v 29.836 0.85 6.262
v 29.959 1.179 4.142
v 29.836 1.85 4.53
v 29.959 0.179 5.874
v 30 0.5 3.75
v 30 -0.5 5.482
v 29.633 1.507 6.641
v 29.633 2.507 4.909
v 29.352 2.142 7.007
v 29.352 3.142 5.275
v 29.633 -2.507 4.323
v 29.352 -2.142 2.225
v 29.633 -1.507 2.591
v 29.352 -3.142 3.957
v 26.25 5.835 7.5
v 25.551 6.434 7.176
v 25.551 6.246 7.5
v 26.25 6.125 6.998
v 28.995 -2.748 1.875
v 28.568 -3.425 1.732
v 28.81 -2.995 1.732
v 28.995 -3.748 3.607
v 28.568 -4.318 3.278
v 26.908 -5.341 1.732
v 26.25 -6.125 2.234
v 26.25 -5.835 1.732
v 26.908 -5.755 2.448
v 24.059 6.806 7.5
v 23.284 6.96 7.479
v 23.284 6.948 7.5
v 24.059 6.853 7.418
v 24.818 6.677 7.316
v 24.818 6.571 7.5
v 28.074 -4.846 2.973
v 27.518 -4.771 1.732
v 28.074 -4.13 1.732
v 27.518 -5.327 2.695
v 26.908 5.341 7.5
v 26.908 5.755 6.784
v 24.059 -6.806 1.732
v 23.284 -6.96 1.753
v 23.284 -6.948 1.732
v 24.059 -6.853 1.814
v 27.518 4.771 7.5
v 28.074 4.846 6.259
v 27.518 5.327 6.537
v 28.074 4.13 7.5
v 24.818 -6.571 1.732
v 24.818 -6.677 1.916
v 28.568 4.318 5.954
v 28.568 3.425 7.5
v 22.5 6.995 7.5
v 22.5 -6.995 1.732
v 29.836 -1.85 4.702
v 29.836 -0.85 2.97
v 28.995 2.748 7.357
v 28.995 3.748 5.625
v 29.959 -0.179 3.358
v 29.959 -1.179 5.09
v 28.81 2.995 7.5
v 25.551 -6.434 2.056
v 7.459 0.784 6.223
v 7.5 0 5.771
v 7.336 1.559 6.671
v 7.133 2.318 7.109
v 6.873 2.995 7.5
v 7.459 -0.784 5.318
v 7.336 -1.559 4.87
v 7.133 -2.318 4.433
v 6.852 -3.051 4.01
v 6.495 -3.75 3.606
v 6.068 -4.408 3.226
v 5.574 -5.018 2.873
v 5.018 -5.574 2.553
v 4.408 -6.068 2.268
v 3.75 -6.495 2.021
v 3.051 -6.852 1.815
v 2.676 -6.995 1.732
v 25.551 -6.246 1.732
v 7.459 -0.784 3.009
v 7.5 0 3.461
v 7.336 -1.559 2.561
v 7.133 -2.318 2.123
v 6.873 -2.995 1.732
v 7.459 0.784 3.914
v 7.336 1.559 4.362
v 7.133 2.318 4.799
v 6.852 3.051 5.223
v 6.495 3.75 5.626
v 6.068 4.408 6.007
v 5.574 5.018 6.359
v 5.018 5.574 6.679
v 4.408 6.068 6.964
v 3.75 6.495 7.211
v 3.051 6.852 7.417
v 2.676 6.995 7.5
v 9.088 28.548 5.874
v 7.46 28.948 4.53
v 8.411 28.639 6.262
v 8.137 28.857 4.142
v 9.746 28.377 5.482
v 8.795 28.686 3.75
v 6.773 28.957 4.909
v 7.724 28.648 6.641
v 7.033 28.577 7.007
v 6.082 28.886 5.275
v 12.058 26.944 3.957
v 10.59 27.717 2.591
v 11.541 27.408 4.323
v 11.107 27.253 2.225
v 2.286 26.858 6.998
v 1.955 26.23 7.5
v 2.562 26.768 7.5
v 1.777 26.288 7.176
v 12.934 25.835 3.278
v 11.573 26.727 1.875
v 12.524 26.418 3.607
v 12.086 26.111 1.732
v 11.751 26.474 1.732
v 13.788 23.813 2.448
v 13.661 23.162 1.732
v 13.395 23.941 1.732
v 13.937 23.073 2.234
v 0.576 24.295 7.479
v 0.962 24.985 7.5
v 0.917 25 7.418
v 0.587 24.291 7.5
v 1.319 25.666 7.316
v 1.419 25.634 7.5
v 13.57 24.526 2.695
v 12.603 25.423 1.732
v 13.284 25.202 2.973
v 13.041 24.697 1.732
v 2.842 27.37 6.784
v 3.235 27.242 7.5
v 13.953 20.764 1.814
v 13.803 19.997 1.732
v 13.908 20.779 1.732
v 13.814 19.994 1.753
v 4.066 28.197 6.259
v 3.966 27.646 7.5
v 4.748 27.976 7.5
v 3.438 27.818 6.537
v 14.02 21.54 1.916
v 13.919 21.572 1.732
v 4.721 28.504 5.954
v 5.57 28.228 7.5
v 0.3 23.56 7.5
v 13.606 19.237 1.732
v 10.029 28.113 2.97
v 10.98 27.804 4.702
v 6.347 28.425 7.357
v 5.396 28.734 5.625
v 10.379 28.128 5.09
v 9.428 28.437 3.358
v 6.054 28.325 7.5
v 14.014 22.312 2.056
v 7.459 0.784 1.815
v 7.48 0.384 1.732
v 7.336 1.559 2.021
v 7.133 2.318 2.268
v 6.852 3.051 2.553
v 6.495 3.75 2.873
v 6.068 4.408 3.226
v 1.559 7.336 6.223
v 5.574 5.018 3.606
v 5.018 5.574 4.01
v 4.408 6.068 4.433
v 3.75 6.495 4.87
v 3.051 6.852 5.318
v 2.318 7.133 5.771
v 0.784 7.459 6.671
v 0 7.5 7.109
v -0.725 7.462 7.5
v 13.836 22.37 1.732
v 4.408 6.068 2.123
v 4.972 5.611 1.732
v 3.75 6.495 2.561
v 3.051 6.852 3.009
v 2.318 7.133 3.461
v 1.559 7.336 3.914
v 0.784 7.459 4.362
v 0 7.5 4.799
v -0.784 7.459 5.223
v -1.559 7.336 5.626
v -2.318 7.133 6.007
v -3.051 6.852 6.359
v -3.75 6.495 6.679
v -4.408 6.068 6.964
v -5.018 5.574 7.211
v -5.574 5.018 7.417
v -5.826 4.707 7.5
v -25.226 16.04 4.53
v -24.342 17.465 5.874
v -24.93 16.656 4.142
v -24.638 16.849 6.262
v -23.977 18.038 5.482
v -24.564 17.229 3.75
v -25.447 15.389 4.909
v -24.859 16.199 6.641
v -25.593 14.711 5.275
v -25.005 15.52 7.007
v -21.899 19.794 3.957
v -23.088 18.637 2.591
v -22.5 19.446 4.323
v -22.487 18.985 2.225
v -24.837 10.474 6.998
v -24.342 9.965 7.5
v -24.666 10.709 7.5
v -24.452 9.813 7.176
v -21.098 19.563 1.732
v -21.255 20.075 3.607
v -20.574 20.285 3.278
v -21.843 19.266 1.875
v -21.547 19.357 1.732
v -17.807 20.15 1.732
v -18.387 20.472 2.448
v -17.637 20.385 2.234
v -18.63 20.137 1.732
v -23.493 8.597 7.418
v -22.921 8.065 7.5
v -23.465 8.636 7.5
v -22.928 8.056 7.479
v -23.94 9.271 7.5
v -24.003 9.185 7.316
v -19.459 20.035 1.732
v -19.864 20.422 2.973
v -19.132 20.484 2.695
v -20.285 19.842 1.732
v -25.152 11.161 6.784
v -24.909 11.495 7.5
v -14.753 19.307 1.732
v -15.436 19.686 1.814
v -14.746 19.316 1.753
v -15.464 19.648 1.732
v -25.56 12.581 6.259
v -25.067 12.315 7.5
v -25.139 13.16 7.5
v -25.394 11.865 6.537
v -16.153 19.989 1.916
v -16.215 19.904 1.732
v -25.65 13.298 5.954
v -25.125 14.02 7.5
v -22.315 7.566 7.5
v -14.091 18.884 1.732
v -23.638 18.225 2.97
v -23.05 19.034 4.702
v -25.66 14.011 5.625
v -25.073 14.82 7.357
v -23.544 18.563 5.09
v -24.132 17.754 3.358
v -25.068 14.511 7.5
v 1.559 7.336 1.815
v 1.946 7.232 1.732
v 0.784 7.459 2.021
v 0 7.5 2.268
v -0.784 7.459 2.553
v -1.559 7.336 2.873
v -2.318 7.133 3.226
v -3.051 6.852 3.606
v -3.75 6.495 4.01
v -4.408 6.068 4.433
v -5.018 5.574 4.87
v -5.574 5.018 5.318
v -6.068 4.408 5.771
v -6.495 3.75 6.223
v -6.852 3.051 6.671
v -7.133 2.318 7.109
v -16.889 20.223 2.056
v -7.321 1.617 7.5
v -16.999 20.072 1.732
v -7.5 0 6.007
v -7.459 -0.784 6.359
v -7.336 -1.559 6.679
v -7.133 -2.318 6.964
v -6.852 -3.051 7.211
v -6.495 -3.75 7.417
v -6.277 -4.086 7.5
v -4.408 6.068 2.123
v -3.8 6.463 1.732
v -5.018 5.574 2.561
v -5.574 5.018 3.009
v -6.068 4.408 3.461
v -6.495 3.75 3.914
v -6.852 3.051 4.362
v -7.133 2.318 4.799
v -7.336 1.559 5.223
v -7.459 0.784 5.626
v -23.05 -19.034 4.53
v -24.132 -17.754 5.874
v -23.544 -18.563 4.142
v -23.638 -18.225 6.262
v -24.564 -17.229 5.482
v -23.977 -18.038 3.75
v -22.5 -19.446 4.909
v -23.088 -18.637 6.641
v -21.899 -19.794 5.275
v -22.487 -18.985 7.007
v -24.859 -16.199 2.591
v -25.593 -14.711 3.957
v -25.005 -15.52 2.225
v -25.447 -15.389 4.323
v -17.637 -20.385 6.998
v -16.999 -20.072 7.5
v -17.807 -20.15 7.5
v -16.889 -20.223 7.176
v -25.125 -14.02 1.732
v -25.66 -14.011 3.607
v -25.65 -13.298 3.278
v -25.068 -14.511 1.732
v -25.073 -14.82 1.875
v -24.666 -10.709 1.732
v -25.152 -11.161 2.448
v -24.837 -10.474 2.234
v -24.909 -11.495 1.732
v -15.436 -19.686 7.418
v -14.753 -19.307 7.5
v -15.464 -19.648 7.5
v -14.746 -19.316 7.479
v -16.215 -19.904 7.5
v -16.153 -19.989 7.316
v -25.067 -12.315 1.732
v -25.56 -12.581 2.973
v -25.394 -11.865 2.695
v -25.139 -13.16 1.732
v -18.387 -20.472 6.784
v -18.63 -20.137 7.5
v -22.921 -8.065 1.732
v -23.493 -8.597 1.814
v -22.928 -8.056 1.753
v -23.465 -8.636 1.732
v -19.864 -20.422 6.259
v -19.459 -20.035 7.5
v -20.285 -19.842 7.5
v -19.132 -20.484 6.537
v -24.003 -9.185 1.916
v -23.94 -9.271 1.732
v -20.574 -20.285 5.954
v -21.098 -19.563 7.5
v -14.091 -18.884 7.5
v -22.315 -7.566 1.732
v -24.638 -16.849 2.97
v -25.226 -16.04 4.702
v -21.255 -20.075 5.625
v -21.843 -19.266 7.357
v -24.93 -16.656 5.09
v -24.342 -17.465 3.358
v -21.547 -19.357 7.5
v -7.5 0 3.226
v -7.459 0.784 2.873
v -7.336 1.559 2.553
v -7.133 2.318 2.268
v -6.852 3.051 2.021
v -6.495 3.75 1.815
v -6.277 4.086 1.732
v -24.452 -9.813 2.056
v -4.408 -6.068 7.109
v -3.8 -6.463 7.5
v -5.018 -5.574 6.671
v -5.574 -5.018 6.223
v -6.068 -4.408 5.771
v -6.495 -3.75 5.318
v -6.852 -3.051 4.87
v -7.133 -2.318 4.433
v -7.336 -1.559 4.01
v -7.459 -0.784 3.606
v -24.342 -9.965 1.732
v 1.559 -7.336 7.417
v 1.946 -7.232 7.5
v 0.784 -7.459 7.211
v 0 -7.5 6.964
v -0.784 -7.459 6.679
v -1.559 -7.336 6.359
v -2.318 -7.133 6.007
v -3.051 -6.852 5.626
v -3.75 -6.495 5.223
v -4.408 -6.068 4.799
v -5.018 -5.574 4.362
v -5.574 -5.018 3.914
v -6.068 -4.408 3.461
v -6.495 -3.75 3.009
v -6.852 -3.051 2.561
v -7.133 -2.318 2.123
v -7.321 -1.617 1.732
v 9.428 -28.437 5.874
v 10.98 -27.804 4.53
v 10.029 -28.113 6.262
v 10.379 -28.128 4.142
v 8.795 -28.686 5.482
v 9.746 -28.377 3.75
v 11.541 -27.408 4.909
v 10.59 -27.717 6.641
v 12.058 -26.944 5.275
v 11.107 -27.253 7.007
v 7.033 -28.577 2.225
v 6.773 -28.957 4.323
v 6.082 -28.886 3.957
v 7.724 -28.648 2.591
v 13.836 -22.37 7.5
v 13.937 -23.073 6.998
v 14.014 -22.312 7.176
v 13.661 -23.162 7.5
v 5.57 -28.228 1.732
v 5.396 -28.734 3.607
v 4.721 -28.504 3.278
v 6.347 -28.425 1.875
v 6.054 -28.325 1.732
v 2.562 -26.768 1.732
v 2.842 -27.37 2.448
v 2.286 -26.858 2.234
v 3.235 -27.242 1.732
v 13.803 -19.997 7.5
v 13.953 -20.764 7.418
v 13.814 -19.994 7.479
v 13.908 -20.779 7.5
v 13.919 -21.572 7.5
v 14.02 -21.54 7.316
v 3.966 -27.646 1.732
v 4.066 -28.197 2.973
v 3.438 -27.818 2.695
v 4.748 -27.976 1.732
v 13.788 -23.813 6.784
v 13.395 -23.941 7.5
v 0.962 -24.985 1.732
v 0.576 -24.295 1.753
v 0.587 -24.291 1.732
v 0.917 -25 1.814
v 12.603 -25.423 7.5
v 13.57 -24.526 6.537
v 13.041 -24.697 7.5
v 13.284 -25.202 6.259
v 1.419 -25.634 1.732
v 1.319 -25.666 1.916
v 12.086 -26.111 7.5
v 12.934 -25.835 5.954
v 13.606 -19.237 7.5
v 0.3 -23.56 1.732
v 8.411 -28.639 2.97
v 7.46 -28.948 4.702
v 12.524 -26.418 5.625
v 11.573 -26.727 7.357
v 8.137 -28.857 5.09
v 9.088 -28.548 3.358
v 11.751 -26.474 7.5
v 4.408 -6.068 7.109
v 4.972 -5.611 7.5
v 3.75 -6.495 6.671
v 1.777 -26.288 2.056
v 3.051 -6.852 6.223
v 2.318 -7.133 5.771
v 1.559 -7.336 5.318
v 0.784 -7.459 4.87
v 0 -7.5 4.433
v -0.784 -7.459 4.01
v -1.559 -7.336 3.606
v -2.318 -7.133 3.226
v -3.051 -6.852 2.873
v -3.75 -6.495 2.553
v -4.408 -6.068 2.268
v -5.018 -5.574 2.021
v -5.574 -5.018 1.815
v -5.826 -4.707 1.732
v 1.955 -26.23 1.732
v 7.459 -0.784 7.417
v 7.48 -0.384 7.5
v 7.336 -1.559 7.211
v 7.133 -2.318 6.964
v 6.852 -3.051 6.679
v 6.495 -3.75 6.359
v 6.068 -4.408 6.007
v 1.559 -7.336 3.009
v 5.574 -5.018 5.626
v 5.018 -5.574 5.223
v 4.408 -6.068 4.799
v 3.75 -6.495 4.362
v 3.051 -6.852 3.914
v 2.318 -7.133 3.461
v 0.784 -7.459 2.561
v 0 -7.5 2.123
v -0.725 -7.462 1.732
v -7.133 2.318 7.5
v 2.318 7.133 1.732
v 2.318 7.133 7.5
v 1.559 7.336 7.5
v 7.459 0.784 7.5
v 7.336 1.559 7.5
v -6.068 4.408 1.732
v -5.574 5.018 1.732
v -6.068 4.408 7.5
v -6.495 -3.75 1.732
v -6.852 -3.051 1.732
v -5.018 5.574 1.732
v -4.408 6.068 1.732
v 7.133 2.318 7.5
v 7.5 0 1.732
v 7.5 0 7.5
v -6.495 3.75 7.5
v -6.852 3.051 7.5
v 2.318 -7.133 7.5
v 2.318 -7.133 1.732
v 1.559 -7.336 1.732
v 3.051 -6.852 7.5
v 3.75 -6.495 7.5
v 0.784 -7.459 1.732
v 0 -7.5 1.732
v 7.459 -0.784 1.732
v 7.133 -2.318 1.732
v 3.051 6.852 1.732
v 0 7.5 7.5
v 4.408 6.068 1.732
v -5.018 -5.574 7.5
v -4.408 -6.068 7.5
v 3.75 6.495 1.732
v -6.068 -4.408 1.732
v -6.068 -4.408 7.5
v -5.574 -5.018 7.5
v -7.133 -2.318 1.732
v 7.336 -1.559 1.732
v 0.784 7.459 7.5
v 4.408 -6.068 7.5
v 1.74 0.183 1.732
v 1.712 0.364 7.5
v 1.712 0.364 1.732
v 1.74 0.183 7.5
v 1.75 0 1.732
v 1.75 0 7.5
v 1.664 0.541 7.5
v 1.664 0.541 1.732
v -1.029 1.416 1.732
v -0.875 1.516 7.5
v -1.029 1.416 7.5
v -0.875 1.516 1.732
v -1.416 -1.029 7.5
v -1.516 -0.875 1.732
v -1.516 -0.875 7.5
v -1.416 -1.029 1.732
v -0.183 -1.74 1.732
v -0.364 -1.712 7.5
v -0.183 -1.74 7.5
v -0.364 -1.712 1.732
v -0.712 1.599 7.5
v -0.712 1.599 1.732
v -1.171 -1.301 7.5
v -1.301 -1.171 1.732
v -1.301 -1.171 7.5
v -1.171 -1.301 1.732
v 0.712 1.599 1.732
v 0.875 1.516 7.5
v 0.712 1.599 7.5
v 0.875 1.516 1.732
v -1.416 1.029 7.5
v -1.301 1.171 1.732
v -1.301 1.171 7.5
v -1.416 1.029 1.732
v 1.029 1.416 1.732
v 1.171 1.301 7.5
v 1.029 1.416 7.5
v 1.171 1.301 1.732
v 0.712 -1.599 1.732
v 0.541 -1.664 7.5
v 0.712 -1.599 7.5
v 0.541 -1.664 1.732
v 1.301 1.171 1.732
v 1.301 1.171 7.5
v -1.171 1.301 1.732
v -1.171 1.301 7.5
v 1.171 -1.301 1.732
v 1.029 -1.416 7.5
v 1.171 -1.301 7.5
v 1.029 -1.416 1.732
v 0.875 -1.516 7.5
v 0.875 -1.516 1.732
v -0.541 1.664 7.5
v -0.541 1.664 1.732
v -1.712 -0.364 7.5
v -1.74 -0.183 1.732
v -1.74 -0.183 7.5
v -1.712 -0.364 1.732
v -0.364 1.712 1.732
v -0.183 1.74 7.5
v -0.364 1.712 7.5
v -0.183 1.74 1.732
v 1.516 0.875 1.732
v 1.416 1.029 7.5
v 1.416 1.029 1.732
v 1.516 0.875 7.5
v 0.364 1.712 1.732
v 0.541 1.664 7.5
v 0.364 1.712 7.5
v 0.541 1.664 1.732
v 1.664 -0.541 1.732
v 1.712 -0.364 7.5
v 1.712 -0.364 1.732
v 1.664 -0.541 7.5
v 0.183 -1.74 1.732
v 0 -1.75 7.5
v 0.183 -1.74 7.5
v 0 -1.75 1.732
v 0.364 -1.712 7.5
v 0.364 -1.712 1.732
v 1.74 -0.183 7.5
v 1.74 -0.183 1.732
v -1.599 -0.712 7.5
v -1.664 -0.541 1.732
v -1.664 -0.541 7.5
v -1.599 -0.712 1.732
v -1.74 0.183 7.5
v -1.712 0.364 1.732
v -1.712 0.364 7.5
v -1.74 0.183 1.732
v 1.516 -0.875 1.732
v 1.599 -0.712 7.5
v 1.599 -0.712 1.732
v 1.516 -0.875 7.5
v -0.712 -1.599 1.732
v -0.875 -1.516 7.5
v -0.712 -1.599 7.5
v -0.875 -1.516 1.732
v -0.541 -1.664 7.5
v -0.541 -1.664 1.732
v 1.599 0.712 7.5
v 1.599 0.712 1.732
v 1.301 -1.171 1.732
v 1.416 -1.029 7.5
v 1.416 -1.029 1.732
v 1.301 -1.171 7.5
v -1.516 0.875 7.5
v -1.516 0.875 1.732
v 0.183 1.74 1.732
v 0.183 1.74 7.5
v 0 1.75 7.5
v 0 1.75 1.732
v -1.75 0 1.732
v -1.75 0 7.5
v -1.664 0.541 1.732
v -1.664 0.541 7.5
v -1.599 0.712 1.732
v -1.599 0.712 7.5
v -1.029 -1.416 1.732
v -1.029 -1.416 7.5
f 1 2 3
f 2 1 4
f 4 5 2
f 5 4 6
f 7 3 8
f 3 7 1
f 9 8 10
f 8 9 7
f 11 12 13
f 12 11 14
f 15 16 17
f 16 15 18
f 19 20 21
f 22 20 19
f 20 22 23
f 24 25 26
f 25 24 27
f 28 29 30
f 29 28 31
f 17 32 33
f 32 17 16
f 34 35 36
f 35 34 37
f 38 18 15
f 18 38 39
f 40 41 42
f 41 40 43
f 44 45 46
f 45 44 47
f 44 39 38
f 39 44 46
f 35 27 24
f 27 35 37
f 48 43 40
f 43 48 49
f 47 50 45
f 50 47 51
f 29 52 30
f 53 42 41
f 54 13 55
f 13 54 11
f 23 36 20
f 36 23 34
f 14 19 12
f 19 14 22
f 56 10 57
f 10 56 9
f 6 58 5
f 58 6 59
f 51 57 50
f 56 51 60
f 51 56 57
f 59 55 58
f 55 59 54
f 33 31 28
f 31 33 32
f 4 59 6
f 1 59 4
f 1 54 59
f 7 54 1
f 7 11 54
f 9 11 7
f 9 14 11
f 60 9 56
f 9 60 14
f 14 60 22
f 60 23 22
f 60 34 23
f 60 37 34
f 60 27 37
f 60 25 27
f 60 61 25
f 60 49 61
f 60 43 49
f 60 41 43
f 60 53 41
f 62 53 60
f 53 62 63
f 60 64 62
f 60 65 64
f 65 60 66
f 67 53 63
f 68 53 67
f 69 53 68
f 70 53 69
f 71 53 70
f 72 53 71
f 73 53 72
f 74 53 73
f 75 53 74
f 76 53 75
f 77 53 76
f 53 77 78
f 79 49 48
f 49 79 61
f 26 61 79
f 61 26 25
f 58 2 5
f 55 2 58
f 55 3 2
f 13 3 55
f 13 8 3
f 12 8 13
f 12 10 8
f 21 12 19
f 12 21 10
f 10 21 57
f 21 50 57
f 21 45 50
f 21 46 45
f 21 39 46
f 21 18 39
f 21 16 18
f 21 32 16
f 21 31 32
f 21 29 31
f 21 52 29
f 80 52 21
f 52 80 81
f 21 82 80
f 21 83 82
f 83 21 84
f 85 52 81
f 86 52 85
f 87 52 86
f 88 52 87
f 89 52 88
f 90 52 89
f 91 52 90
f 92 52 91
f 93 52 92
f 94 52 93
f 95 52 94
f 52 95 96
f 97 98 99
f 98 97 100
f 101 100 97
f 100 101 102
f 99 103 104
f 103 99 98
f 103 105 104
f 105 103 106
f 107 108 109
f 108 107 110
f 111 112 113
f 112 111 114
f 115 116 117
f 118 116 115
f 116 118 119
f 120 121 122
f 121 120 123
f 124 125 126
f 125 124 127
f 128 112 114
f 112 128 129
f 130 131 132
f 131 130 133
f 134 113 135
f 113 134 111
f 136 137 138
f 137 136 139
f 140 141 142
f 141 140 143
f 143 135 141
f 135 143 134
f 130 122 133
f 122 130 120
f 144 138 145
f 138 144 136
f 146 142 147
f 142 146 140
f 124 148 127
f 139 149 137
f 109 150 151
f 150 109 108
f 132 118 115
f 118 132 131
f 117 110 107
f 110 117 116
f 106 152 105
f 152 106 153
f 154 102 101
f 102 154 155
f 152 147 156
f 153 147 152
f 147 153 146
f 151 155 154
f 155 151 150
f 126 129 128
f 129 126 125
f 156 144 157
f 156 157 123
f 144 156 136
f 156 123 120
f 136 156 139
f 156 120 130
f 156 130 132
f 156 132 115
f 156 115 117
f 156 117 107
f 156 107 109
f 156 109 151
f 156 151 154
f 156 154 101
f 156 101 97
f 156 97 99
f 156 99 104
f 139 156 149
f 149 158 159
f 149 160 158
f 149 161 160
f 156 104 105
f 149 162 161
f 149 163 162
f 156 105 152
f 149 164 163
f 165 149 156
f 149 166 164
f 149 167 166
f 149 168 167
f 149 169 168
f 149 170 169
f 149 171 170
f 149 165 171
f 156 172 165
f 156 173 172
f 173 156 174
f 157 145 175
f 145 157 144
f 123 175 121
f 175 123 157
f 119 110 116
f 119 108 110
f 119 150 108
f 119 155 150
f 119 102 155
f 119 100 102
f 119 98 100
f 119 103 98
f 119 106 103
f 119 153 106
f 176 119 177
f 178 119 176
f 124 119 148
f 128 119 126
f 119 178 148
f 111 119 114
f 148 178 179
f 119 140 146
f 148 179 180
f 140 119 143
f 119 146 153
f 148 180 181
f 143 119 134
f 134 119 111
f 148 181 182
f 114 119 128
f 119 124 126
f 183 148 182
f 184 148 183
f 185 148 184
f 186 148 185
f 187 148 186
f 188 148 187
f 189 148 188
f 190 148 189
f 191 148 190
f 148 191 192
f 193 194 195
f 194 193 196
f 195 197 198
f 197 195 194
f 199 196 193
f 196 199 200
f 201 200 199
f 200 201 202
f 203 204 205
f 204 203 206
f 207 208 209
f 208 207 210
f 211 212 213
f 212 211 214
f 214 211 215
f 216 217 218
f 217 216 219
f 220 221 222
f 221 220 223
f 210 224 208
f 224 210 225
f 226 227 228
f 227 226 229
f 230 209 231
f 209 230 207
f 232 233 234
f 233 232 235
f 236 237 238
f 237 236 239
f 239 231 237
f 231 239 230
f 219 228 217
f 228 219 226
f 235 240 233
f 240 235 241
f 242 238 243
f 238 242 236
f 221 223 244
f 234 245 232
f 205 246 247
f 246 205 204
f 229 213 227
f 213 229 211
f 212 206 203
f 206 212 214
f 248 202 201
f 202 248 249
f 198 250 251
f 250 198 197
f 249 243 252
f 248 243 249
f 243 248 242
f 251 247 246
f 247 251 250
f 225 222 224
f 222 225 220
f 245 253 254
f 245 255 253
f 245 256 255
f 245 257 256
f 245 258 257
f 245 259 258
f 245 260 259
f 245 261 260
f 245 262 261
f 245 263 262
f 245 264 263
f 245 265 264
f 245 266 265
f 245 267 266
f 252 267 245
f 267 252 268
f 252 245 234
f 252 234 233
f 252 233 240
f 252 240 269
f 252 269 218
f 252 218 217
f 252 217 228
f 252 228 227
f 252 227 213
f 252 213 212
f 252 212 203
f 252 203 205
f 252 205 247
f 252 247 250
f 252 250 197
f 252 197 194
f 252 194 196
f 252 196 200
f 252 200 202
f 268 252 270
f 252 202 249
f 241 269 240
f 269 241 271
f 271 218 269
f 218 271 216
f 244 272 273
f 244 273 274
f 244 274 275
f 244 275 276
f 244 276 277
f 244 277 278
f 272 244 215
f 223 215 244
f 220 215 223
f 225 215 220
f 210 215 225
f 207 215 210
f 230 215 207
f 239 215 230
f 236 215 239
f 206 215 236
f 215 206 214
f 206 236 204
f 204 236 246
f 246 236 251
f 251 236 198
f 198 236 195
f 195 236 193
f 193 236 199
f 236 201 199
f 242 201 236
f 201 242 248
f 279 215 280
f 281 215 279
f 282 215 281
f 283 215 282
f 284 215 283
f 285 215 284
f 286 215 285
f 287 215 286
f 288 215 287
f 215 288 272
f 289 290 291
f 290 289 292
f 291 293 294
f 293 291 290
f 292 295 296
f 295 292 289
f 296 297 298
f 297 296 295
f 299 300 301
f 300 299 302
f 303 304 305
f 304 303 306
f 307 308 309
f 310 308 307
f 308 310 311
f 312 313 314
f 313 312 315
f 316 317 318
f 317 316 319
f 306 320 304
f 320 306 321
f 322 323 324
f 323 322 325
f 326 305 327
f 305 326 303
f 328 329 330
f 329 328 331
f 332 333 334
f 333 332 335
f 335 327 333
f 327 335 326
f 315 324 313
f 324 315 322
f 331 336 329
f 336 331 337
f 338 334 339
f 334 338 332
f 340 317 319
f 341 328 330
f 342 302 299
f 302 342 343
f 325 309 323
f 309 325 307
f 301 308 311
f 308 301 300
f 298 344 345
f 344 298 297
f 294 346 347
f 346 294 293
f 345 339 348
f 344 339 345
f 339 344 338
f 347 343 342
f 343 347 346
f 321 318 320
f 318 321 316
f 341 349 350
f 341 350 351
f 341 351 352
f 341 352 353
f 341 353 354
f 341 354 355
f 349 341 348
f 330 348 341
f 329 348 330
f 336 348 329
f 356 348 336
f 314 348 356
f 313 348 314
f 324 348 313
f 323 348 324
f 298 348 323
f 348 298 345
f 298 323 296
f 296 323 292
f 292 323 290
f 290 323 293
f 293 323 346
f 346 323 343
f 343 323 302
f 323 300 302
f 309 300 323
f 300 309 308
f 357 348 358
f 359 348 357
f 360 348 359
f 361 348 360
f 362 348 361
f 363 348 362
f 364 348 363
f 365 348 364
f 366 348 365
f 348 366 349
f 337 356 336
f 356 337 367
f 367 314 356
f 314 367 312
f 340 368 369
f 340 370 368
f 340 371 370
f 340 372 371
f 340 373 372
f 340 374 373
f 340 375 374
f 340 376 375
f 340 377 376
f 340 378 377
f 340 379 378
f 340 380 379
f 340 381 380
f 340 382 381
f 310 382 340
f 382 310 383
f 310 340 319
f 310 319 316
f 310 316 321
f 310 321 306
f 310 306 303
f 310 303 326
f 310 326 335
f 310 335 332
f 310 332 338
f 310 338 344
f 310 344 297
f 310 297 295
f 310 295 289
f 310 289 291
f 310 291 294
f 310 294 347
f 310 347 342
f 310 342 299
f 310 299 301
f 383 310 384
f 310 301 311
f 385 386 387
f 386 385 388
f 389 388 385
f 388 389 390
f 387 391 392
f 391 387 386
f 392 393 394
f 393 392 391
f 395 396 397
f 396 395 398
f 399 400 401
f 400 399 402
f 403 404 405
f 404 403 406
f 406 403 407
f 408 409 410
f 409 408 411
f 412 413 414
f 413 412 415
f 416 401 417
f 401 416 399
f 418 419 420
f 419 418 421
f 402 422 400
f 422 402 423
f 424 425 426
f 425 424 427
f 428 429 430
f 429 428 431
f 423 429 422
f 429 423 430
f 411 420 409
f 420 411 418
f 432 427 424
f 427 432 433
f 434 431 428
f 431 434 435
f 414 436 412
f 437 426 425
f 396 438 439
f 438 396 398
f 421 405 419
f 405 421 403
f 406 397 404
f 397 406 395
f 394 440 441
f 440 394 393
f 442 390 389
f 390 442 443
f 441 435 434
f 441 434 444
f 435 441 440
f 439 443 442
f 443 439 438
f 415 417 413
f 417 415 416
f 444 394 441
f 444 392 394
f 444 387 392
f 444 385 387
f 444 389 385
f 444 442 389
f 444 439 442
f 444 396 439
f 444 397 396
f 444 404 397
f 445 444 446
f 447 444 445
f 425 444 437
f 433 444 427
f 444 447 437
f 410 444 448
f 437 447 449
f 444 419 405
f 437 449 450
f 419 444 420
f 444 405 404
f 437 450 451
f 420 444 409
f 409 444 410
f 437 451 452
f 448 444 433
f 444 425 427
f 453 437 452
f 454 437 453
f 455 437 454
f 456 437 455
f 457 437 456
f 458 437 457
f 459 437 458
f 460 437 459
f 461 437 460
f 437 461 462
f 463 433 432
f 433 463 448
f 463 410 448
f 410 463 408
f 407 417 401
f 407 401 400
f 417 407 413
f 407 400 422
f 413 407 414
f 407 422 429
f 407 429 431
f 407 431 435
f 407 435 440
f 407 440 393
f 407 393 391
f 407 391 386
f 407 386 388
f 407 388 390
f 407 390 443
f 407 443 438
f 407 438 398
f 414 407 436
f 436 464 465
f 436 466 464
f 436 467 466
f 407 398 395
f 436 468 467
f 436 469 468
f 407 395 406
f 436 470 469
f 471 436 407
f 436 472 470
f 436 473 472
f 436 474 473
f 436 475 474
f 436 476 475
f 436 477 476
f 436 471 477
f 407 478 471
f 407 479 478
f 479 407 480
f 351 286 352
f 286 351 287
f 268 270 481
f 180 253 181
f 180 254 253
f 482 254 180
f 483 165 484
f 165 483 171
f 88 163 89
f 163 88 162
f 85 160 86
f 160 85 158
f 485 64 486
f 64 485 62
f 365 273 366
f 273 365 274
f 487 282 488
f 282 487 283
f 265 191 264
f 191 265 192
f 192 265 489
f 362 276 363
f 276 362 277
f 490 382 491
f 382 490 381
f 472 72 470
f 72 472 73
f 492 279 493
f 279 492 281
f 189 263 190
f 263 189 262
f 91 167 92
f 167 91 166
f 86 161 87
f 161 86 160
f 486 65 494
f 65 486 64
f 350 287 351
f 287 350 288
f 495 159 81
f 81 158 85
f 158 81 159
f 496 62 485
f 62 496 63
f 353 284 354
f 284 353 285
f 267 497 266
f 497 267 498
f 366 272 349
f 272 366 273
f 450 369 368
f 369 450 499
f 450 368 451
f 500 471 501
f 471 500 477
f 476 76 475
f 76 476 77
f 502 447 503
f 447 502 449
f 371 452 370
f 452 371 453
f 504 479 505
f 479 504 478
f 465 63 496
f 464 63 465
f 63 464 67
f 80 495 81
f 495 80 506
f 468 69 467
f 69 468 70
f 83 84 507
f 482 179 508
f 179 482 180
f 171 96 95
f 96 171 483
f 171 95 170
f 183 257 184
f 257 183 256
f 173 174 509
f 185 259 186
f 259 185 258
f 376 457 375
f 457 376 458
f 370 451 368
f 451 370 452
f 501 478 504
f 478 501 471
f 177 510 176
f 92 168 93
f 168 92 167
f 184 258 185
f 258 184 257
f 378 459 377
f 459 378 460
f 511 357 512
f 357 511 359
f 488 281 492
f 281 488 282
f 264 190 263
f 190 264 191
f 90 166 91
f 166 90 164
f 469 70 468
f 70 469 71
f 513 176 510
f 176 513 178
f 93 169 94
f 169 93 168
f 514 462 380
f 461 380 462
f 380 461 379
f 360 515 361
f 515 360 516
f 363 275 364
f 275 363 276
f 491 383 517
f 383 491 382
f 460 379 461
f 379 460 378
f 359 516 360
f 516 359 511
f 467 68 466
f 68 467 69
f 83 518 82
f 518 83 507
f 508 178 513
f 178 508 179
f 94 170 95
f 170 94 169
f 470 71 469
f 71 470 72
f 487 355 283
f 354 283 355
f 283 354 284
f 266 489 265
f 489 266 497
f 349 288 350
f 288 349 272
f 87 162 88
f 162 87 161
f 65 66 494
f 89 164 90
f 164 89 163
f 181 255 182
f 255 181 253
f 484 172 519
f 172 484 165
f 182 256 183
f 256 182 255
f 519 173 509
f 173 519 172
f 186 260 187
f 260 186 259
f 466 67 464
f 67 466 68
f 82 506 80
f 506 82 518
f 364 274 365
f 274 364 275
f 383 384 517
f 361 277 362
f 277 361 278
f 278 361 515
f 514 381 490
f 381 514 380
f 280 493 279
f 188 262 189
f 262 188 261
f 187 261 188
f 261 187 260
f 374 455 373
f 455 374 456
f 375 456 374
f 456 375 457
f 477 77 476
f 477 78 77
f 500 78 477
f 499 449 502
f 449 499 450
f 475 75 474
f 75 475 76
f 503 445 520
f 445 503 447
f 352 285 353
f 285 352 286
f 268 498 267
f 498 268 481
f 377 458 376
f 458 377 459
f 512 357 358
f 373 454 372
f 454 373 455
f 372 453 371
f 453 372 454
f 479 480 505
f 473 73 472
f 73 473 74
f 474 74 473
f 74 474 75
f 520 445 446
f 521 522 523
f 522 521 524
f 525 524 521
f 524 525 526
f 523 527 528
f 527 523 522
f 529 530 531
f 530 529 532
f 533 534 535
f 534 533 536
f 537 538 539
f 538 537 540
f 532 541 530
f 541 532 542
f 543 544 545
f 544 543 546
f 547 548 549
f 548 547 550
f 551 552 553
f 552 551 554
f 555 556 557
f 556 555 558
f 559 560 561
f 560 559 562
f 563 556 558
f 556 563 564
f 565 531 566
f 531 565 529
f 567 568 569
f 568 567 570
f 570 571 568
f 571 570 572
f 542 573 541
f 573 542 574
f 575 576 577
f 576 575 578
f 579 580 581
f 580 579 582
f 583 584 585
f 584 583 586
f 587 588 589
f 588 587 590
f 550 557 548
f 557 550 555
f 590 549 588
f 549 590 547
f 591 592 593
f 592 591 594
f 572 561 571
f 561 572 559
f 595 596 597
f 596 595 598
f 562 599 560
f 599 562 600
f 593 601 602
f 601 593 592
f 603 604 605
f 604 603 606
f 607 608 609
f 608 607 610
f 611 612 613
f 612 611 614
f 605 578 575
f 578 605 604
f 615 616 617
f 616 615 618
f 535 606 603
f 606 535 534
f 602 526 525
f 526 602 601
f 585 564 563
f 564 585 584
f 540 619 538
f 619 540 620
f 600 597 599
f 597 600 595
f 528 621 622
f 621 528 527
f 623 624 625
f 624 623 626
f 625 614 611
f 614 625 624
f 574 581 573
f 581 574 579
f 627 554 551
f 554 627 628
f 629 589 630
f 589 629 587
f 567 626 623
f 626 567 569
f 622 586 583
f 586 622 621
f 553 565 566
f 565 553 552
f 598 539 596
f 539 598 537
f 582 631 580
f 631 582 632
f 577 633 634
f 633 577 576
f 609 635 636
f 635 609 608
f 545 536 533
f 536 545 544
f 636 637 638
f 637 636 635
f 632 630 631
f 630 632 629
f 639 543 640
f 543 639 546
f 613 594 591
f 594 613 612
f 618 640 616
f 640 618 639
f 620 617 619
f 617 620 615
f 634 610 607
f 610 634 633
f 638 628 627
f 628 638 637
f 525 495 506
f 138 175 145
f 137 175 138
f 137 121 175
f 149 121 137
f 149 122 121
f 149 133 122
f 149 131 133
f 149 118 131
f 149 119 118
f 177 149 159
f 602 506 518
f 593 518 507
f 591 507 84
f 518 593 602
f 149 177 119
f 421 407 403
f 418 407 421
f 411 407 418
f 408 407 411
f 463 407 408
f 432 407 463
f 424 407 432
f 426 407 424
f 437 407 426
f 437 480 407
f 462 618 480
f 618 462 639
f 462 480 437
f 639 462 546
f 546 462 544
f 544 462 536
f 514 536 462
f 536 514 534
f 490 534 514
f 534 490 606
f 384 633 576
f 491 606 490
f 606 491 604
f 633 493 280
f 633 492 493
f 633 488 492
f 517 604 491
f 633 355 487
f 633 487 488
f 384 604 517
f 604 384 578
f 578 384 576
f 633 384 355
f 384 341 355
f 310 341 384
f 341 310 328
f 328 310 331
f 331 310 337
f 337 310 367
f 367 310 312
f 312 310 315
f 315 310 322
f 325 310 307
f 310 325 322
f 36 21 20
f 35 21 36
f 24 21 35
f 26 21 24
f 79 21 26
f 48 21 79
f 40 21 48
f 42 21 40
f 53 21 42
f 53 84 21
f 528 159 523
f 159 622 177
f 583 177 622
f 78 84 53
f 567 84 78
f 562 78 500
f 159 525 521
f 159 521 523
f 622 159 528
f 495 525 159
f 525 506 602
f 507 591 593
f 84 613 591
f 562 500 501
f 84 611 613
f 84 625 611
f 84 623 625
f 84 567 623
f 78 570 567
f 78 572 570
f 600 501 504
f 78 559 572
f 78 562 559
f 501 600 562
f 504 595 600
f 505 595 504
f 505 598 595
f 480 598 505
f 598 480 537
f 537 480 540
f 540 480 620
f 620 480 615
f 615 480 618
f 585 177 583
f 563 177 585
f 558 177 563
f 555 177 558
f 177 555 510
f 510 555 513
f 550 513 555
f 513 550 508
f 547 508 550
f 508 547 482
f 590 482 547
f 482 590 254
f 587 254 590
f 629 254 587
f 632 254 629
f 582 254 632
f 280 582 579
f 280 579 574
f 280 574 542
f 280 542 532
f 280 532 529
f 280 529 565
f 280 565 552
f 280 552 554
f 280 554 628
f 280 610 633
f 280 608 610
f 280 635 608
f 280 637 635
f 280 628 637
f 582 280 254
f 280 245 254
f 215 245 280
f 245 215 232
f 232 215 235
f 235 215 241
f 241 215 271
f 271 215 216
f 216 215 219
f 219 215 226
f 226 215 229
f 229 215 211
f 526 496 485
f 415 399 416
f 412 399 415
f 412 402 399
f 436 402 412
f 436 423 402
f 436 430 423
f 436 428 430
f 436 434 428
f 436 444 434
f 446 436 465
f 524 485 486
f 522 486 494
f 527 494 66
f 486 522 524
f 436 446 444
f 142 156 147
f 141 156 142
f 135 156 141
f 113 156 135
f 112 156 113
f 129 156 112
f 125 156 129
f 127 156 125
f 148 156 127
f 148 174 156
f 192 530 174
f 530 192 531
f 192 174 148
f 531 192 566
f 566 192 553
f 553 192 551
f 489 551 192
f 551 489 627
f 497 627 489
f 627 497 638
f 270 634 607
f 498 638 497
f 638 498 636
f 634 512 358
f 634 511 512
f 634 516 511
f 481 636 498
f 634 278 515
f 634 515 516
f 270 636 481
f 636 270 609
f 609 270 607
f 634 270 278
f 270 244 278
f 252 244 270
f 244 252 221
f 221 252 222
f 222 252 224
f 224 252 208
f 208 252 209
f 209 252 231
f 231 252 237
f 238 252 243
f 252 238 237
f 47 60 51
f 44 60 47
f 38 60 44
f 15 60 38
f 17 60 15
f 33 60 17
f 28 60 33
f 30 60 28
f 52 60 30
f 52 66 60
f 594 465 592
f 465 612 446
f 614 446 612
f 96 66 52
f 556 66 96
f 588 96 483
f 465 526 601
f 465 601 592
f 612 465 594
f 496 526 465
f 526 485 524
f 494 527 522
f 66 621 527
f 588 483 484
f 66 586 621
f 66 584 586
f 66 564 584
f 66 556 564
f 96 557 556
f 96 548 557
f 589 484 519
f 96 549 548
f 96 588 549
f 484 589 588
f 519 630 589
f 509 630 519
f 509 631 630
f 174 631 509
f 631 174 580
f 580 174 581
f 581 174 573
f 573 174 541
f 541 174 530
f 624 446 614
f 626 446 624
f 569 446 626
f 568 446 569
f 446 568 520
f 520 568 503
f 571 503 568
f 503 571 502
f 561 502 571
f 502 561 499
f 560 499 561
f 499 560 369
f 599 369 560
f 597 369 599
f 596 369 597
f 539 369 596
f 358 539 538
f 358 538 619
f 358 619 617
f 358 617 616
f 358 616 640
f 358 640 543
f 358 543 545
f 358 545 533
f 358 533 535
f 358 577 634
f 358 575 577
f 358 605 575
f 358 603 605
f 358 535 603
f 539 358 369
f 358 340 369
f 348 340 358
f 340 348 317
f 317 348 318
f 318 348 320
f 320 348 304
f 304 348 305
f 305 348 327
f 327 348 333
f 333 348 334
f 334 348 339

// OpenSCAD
eps = 0.01;
angle = 30;
blades = 5;
d = 15;
h = 2;
l = 30;

module blade()
{
  dx = l-d/2;
  off = d*cos(angle) - h*cos(90-angle);
  translate([0, -off/2, 0])
    rotate([angle, 0, 0])
      {
        translate([dx, d/2, 0])
          cylinder(d=d, h=h, $fn=60);
        cube([dx, d, h]);
      }
}


module screw()
{
  module base()
  {
    difference()
    {
      union()
      {
        // core
        cylinder(d=d, h=d, $fn=60);
        // blades
        for(r=[0:blades-1])
          rotate([0, 0, r*360/blades])
            blade();
      }
      // rod hole
      translate([0, 0, -eps])
        cylinder(d=3.5, h=d+2*eps, $fn=60);
    }
  }
  intersection()
  {
    q = d*sin(angle);
    dh = h*sin(90-angle);
    base();
    translate([0, 0, dh])
      cylinder(d=3*l, h=q-dh);
  }
}

screw();
